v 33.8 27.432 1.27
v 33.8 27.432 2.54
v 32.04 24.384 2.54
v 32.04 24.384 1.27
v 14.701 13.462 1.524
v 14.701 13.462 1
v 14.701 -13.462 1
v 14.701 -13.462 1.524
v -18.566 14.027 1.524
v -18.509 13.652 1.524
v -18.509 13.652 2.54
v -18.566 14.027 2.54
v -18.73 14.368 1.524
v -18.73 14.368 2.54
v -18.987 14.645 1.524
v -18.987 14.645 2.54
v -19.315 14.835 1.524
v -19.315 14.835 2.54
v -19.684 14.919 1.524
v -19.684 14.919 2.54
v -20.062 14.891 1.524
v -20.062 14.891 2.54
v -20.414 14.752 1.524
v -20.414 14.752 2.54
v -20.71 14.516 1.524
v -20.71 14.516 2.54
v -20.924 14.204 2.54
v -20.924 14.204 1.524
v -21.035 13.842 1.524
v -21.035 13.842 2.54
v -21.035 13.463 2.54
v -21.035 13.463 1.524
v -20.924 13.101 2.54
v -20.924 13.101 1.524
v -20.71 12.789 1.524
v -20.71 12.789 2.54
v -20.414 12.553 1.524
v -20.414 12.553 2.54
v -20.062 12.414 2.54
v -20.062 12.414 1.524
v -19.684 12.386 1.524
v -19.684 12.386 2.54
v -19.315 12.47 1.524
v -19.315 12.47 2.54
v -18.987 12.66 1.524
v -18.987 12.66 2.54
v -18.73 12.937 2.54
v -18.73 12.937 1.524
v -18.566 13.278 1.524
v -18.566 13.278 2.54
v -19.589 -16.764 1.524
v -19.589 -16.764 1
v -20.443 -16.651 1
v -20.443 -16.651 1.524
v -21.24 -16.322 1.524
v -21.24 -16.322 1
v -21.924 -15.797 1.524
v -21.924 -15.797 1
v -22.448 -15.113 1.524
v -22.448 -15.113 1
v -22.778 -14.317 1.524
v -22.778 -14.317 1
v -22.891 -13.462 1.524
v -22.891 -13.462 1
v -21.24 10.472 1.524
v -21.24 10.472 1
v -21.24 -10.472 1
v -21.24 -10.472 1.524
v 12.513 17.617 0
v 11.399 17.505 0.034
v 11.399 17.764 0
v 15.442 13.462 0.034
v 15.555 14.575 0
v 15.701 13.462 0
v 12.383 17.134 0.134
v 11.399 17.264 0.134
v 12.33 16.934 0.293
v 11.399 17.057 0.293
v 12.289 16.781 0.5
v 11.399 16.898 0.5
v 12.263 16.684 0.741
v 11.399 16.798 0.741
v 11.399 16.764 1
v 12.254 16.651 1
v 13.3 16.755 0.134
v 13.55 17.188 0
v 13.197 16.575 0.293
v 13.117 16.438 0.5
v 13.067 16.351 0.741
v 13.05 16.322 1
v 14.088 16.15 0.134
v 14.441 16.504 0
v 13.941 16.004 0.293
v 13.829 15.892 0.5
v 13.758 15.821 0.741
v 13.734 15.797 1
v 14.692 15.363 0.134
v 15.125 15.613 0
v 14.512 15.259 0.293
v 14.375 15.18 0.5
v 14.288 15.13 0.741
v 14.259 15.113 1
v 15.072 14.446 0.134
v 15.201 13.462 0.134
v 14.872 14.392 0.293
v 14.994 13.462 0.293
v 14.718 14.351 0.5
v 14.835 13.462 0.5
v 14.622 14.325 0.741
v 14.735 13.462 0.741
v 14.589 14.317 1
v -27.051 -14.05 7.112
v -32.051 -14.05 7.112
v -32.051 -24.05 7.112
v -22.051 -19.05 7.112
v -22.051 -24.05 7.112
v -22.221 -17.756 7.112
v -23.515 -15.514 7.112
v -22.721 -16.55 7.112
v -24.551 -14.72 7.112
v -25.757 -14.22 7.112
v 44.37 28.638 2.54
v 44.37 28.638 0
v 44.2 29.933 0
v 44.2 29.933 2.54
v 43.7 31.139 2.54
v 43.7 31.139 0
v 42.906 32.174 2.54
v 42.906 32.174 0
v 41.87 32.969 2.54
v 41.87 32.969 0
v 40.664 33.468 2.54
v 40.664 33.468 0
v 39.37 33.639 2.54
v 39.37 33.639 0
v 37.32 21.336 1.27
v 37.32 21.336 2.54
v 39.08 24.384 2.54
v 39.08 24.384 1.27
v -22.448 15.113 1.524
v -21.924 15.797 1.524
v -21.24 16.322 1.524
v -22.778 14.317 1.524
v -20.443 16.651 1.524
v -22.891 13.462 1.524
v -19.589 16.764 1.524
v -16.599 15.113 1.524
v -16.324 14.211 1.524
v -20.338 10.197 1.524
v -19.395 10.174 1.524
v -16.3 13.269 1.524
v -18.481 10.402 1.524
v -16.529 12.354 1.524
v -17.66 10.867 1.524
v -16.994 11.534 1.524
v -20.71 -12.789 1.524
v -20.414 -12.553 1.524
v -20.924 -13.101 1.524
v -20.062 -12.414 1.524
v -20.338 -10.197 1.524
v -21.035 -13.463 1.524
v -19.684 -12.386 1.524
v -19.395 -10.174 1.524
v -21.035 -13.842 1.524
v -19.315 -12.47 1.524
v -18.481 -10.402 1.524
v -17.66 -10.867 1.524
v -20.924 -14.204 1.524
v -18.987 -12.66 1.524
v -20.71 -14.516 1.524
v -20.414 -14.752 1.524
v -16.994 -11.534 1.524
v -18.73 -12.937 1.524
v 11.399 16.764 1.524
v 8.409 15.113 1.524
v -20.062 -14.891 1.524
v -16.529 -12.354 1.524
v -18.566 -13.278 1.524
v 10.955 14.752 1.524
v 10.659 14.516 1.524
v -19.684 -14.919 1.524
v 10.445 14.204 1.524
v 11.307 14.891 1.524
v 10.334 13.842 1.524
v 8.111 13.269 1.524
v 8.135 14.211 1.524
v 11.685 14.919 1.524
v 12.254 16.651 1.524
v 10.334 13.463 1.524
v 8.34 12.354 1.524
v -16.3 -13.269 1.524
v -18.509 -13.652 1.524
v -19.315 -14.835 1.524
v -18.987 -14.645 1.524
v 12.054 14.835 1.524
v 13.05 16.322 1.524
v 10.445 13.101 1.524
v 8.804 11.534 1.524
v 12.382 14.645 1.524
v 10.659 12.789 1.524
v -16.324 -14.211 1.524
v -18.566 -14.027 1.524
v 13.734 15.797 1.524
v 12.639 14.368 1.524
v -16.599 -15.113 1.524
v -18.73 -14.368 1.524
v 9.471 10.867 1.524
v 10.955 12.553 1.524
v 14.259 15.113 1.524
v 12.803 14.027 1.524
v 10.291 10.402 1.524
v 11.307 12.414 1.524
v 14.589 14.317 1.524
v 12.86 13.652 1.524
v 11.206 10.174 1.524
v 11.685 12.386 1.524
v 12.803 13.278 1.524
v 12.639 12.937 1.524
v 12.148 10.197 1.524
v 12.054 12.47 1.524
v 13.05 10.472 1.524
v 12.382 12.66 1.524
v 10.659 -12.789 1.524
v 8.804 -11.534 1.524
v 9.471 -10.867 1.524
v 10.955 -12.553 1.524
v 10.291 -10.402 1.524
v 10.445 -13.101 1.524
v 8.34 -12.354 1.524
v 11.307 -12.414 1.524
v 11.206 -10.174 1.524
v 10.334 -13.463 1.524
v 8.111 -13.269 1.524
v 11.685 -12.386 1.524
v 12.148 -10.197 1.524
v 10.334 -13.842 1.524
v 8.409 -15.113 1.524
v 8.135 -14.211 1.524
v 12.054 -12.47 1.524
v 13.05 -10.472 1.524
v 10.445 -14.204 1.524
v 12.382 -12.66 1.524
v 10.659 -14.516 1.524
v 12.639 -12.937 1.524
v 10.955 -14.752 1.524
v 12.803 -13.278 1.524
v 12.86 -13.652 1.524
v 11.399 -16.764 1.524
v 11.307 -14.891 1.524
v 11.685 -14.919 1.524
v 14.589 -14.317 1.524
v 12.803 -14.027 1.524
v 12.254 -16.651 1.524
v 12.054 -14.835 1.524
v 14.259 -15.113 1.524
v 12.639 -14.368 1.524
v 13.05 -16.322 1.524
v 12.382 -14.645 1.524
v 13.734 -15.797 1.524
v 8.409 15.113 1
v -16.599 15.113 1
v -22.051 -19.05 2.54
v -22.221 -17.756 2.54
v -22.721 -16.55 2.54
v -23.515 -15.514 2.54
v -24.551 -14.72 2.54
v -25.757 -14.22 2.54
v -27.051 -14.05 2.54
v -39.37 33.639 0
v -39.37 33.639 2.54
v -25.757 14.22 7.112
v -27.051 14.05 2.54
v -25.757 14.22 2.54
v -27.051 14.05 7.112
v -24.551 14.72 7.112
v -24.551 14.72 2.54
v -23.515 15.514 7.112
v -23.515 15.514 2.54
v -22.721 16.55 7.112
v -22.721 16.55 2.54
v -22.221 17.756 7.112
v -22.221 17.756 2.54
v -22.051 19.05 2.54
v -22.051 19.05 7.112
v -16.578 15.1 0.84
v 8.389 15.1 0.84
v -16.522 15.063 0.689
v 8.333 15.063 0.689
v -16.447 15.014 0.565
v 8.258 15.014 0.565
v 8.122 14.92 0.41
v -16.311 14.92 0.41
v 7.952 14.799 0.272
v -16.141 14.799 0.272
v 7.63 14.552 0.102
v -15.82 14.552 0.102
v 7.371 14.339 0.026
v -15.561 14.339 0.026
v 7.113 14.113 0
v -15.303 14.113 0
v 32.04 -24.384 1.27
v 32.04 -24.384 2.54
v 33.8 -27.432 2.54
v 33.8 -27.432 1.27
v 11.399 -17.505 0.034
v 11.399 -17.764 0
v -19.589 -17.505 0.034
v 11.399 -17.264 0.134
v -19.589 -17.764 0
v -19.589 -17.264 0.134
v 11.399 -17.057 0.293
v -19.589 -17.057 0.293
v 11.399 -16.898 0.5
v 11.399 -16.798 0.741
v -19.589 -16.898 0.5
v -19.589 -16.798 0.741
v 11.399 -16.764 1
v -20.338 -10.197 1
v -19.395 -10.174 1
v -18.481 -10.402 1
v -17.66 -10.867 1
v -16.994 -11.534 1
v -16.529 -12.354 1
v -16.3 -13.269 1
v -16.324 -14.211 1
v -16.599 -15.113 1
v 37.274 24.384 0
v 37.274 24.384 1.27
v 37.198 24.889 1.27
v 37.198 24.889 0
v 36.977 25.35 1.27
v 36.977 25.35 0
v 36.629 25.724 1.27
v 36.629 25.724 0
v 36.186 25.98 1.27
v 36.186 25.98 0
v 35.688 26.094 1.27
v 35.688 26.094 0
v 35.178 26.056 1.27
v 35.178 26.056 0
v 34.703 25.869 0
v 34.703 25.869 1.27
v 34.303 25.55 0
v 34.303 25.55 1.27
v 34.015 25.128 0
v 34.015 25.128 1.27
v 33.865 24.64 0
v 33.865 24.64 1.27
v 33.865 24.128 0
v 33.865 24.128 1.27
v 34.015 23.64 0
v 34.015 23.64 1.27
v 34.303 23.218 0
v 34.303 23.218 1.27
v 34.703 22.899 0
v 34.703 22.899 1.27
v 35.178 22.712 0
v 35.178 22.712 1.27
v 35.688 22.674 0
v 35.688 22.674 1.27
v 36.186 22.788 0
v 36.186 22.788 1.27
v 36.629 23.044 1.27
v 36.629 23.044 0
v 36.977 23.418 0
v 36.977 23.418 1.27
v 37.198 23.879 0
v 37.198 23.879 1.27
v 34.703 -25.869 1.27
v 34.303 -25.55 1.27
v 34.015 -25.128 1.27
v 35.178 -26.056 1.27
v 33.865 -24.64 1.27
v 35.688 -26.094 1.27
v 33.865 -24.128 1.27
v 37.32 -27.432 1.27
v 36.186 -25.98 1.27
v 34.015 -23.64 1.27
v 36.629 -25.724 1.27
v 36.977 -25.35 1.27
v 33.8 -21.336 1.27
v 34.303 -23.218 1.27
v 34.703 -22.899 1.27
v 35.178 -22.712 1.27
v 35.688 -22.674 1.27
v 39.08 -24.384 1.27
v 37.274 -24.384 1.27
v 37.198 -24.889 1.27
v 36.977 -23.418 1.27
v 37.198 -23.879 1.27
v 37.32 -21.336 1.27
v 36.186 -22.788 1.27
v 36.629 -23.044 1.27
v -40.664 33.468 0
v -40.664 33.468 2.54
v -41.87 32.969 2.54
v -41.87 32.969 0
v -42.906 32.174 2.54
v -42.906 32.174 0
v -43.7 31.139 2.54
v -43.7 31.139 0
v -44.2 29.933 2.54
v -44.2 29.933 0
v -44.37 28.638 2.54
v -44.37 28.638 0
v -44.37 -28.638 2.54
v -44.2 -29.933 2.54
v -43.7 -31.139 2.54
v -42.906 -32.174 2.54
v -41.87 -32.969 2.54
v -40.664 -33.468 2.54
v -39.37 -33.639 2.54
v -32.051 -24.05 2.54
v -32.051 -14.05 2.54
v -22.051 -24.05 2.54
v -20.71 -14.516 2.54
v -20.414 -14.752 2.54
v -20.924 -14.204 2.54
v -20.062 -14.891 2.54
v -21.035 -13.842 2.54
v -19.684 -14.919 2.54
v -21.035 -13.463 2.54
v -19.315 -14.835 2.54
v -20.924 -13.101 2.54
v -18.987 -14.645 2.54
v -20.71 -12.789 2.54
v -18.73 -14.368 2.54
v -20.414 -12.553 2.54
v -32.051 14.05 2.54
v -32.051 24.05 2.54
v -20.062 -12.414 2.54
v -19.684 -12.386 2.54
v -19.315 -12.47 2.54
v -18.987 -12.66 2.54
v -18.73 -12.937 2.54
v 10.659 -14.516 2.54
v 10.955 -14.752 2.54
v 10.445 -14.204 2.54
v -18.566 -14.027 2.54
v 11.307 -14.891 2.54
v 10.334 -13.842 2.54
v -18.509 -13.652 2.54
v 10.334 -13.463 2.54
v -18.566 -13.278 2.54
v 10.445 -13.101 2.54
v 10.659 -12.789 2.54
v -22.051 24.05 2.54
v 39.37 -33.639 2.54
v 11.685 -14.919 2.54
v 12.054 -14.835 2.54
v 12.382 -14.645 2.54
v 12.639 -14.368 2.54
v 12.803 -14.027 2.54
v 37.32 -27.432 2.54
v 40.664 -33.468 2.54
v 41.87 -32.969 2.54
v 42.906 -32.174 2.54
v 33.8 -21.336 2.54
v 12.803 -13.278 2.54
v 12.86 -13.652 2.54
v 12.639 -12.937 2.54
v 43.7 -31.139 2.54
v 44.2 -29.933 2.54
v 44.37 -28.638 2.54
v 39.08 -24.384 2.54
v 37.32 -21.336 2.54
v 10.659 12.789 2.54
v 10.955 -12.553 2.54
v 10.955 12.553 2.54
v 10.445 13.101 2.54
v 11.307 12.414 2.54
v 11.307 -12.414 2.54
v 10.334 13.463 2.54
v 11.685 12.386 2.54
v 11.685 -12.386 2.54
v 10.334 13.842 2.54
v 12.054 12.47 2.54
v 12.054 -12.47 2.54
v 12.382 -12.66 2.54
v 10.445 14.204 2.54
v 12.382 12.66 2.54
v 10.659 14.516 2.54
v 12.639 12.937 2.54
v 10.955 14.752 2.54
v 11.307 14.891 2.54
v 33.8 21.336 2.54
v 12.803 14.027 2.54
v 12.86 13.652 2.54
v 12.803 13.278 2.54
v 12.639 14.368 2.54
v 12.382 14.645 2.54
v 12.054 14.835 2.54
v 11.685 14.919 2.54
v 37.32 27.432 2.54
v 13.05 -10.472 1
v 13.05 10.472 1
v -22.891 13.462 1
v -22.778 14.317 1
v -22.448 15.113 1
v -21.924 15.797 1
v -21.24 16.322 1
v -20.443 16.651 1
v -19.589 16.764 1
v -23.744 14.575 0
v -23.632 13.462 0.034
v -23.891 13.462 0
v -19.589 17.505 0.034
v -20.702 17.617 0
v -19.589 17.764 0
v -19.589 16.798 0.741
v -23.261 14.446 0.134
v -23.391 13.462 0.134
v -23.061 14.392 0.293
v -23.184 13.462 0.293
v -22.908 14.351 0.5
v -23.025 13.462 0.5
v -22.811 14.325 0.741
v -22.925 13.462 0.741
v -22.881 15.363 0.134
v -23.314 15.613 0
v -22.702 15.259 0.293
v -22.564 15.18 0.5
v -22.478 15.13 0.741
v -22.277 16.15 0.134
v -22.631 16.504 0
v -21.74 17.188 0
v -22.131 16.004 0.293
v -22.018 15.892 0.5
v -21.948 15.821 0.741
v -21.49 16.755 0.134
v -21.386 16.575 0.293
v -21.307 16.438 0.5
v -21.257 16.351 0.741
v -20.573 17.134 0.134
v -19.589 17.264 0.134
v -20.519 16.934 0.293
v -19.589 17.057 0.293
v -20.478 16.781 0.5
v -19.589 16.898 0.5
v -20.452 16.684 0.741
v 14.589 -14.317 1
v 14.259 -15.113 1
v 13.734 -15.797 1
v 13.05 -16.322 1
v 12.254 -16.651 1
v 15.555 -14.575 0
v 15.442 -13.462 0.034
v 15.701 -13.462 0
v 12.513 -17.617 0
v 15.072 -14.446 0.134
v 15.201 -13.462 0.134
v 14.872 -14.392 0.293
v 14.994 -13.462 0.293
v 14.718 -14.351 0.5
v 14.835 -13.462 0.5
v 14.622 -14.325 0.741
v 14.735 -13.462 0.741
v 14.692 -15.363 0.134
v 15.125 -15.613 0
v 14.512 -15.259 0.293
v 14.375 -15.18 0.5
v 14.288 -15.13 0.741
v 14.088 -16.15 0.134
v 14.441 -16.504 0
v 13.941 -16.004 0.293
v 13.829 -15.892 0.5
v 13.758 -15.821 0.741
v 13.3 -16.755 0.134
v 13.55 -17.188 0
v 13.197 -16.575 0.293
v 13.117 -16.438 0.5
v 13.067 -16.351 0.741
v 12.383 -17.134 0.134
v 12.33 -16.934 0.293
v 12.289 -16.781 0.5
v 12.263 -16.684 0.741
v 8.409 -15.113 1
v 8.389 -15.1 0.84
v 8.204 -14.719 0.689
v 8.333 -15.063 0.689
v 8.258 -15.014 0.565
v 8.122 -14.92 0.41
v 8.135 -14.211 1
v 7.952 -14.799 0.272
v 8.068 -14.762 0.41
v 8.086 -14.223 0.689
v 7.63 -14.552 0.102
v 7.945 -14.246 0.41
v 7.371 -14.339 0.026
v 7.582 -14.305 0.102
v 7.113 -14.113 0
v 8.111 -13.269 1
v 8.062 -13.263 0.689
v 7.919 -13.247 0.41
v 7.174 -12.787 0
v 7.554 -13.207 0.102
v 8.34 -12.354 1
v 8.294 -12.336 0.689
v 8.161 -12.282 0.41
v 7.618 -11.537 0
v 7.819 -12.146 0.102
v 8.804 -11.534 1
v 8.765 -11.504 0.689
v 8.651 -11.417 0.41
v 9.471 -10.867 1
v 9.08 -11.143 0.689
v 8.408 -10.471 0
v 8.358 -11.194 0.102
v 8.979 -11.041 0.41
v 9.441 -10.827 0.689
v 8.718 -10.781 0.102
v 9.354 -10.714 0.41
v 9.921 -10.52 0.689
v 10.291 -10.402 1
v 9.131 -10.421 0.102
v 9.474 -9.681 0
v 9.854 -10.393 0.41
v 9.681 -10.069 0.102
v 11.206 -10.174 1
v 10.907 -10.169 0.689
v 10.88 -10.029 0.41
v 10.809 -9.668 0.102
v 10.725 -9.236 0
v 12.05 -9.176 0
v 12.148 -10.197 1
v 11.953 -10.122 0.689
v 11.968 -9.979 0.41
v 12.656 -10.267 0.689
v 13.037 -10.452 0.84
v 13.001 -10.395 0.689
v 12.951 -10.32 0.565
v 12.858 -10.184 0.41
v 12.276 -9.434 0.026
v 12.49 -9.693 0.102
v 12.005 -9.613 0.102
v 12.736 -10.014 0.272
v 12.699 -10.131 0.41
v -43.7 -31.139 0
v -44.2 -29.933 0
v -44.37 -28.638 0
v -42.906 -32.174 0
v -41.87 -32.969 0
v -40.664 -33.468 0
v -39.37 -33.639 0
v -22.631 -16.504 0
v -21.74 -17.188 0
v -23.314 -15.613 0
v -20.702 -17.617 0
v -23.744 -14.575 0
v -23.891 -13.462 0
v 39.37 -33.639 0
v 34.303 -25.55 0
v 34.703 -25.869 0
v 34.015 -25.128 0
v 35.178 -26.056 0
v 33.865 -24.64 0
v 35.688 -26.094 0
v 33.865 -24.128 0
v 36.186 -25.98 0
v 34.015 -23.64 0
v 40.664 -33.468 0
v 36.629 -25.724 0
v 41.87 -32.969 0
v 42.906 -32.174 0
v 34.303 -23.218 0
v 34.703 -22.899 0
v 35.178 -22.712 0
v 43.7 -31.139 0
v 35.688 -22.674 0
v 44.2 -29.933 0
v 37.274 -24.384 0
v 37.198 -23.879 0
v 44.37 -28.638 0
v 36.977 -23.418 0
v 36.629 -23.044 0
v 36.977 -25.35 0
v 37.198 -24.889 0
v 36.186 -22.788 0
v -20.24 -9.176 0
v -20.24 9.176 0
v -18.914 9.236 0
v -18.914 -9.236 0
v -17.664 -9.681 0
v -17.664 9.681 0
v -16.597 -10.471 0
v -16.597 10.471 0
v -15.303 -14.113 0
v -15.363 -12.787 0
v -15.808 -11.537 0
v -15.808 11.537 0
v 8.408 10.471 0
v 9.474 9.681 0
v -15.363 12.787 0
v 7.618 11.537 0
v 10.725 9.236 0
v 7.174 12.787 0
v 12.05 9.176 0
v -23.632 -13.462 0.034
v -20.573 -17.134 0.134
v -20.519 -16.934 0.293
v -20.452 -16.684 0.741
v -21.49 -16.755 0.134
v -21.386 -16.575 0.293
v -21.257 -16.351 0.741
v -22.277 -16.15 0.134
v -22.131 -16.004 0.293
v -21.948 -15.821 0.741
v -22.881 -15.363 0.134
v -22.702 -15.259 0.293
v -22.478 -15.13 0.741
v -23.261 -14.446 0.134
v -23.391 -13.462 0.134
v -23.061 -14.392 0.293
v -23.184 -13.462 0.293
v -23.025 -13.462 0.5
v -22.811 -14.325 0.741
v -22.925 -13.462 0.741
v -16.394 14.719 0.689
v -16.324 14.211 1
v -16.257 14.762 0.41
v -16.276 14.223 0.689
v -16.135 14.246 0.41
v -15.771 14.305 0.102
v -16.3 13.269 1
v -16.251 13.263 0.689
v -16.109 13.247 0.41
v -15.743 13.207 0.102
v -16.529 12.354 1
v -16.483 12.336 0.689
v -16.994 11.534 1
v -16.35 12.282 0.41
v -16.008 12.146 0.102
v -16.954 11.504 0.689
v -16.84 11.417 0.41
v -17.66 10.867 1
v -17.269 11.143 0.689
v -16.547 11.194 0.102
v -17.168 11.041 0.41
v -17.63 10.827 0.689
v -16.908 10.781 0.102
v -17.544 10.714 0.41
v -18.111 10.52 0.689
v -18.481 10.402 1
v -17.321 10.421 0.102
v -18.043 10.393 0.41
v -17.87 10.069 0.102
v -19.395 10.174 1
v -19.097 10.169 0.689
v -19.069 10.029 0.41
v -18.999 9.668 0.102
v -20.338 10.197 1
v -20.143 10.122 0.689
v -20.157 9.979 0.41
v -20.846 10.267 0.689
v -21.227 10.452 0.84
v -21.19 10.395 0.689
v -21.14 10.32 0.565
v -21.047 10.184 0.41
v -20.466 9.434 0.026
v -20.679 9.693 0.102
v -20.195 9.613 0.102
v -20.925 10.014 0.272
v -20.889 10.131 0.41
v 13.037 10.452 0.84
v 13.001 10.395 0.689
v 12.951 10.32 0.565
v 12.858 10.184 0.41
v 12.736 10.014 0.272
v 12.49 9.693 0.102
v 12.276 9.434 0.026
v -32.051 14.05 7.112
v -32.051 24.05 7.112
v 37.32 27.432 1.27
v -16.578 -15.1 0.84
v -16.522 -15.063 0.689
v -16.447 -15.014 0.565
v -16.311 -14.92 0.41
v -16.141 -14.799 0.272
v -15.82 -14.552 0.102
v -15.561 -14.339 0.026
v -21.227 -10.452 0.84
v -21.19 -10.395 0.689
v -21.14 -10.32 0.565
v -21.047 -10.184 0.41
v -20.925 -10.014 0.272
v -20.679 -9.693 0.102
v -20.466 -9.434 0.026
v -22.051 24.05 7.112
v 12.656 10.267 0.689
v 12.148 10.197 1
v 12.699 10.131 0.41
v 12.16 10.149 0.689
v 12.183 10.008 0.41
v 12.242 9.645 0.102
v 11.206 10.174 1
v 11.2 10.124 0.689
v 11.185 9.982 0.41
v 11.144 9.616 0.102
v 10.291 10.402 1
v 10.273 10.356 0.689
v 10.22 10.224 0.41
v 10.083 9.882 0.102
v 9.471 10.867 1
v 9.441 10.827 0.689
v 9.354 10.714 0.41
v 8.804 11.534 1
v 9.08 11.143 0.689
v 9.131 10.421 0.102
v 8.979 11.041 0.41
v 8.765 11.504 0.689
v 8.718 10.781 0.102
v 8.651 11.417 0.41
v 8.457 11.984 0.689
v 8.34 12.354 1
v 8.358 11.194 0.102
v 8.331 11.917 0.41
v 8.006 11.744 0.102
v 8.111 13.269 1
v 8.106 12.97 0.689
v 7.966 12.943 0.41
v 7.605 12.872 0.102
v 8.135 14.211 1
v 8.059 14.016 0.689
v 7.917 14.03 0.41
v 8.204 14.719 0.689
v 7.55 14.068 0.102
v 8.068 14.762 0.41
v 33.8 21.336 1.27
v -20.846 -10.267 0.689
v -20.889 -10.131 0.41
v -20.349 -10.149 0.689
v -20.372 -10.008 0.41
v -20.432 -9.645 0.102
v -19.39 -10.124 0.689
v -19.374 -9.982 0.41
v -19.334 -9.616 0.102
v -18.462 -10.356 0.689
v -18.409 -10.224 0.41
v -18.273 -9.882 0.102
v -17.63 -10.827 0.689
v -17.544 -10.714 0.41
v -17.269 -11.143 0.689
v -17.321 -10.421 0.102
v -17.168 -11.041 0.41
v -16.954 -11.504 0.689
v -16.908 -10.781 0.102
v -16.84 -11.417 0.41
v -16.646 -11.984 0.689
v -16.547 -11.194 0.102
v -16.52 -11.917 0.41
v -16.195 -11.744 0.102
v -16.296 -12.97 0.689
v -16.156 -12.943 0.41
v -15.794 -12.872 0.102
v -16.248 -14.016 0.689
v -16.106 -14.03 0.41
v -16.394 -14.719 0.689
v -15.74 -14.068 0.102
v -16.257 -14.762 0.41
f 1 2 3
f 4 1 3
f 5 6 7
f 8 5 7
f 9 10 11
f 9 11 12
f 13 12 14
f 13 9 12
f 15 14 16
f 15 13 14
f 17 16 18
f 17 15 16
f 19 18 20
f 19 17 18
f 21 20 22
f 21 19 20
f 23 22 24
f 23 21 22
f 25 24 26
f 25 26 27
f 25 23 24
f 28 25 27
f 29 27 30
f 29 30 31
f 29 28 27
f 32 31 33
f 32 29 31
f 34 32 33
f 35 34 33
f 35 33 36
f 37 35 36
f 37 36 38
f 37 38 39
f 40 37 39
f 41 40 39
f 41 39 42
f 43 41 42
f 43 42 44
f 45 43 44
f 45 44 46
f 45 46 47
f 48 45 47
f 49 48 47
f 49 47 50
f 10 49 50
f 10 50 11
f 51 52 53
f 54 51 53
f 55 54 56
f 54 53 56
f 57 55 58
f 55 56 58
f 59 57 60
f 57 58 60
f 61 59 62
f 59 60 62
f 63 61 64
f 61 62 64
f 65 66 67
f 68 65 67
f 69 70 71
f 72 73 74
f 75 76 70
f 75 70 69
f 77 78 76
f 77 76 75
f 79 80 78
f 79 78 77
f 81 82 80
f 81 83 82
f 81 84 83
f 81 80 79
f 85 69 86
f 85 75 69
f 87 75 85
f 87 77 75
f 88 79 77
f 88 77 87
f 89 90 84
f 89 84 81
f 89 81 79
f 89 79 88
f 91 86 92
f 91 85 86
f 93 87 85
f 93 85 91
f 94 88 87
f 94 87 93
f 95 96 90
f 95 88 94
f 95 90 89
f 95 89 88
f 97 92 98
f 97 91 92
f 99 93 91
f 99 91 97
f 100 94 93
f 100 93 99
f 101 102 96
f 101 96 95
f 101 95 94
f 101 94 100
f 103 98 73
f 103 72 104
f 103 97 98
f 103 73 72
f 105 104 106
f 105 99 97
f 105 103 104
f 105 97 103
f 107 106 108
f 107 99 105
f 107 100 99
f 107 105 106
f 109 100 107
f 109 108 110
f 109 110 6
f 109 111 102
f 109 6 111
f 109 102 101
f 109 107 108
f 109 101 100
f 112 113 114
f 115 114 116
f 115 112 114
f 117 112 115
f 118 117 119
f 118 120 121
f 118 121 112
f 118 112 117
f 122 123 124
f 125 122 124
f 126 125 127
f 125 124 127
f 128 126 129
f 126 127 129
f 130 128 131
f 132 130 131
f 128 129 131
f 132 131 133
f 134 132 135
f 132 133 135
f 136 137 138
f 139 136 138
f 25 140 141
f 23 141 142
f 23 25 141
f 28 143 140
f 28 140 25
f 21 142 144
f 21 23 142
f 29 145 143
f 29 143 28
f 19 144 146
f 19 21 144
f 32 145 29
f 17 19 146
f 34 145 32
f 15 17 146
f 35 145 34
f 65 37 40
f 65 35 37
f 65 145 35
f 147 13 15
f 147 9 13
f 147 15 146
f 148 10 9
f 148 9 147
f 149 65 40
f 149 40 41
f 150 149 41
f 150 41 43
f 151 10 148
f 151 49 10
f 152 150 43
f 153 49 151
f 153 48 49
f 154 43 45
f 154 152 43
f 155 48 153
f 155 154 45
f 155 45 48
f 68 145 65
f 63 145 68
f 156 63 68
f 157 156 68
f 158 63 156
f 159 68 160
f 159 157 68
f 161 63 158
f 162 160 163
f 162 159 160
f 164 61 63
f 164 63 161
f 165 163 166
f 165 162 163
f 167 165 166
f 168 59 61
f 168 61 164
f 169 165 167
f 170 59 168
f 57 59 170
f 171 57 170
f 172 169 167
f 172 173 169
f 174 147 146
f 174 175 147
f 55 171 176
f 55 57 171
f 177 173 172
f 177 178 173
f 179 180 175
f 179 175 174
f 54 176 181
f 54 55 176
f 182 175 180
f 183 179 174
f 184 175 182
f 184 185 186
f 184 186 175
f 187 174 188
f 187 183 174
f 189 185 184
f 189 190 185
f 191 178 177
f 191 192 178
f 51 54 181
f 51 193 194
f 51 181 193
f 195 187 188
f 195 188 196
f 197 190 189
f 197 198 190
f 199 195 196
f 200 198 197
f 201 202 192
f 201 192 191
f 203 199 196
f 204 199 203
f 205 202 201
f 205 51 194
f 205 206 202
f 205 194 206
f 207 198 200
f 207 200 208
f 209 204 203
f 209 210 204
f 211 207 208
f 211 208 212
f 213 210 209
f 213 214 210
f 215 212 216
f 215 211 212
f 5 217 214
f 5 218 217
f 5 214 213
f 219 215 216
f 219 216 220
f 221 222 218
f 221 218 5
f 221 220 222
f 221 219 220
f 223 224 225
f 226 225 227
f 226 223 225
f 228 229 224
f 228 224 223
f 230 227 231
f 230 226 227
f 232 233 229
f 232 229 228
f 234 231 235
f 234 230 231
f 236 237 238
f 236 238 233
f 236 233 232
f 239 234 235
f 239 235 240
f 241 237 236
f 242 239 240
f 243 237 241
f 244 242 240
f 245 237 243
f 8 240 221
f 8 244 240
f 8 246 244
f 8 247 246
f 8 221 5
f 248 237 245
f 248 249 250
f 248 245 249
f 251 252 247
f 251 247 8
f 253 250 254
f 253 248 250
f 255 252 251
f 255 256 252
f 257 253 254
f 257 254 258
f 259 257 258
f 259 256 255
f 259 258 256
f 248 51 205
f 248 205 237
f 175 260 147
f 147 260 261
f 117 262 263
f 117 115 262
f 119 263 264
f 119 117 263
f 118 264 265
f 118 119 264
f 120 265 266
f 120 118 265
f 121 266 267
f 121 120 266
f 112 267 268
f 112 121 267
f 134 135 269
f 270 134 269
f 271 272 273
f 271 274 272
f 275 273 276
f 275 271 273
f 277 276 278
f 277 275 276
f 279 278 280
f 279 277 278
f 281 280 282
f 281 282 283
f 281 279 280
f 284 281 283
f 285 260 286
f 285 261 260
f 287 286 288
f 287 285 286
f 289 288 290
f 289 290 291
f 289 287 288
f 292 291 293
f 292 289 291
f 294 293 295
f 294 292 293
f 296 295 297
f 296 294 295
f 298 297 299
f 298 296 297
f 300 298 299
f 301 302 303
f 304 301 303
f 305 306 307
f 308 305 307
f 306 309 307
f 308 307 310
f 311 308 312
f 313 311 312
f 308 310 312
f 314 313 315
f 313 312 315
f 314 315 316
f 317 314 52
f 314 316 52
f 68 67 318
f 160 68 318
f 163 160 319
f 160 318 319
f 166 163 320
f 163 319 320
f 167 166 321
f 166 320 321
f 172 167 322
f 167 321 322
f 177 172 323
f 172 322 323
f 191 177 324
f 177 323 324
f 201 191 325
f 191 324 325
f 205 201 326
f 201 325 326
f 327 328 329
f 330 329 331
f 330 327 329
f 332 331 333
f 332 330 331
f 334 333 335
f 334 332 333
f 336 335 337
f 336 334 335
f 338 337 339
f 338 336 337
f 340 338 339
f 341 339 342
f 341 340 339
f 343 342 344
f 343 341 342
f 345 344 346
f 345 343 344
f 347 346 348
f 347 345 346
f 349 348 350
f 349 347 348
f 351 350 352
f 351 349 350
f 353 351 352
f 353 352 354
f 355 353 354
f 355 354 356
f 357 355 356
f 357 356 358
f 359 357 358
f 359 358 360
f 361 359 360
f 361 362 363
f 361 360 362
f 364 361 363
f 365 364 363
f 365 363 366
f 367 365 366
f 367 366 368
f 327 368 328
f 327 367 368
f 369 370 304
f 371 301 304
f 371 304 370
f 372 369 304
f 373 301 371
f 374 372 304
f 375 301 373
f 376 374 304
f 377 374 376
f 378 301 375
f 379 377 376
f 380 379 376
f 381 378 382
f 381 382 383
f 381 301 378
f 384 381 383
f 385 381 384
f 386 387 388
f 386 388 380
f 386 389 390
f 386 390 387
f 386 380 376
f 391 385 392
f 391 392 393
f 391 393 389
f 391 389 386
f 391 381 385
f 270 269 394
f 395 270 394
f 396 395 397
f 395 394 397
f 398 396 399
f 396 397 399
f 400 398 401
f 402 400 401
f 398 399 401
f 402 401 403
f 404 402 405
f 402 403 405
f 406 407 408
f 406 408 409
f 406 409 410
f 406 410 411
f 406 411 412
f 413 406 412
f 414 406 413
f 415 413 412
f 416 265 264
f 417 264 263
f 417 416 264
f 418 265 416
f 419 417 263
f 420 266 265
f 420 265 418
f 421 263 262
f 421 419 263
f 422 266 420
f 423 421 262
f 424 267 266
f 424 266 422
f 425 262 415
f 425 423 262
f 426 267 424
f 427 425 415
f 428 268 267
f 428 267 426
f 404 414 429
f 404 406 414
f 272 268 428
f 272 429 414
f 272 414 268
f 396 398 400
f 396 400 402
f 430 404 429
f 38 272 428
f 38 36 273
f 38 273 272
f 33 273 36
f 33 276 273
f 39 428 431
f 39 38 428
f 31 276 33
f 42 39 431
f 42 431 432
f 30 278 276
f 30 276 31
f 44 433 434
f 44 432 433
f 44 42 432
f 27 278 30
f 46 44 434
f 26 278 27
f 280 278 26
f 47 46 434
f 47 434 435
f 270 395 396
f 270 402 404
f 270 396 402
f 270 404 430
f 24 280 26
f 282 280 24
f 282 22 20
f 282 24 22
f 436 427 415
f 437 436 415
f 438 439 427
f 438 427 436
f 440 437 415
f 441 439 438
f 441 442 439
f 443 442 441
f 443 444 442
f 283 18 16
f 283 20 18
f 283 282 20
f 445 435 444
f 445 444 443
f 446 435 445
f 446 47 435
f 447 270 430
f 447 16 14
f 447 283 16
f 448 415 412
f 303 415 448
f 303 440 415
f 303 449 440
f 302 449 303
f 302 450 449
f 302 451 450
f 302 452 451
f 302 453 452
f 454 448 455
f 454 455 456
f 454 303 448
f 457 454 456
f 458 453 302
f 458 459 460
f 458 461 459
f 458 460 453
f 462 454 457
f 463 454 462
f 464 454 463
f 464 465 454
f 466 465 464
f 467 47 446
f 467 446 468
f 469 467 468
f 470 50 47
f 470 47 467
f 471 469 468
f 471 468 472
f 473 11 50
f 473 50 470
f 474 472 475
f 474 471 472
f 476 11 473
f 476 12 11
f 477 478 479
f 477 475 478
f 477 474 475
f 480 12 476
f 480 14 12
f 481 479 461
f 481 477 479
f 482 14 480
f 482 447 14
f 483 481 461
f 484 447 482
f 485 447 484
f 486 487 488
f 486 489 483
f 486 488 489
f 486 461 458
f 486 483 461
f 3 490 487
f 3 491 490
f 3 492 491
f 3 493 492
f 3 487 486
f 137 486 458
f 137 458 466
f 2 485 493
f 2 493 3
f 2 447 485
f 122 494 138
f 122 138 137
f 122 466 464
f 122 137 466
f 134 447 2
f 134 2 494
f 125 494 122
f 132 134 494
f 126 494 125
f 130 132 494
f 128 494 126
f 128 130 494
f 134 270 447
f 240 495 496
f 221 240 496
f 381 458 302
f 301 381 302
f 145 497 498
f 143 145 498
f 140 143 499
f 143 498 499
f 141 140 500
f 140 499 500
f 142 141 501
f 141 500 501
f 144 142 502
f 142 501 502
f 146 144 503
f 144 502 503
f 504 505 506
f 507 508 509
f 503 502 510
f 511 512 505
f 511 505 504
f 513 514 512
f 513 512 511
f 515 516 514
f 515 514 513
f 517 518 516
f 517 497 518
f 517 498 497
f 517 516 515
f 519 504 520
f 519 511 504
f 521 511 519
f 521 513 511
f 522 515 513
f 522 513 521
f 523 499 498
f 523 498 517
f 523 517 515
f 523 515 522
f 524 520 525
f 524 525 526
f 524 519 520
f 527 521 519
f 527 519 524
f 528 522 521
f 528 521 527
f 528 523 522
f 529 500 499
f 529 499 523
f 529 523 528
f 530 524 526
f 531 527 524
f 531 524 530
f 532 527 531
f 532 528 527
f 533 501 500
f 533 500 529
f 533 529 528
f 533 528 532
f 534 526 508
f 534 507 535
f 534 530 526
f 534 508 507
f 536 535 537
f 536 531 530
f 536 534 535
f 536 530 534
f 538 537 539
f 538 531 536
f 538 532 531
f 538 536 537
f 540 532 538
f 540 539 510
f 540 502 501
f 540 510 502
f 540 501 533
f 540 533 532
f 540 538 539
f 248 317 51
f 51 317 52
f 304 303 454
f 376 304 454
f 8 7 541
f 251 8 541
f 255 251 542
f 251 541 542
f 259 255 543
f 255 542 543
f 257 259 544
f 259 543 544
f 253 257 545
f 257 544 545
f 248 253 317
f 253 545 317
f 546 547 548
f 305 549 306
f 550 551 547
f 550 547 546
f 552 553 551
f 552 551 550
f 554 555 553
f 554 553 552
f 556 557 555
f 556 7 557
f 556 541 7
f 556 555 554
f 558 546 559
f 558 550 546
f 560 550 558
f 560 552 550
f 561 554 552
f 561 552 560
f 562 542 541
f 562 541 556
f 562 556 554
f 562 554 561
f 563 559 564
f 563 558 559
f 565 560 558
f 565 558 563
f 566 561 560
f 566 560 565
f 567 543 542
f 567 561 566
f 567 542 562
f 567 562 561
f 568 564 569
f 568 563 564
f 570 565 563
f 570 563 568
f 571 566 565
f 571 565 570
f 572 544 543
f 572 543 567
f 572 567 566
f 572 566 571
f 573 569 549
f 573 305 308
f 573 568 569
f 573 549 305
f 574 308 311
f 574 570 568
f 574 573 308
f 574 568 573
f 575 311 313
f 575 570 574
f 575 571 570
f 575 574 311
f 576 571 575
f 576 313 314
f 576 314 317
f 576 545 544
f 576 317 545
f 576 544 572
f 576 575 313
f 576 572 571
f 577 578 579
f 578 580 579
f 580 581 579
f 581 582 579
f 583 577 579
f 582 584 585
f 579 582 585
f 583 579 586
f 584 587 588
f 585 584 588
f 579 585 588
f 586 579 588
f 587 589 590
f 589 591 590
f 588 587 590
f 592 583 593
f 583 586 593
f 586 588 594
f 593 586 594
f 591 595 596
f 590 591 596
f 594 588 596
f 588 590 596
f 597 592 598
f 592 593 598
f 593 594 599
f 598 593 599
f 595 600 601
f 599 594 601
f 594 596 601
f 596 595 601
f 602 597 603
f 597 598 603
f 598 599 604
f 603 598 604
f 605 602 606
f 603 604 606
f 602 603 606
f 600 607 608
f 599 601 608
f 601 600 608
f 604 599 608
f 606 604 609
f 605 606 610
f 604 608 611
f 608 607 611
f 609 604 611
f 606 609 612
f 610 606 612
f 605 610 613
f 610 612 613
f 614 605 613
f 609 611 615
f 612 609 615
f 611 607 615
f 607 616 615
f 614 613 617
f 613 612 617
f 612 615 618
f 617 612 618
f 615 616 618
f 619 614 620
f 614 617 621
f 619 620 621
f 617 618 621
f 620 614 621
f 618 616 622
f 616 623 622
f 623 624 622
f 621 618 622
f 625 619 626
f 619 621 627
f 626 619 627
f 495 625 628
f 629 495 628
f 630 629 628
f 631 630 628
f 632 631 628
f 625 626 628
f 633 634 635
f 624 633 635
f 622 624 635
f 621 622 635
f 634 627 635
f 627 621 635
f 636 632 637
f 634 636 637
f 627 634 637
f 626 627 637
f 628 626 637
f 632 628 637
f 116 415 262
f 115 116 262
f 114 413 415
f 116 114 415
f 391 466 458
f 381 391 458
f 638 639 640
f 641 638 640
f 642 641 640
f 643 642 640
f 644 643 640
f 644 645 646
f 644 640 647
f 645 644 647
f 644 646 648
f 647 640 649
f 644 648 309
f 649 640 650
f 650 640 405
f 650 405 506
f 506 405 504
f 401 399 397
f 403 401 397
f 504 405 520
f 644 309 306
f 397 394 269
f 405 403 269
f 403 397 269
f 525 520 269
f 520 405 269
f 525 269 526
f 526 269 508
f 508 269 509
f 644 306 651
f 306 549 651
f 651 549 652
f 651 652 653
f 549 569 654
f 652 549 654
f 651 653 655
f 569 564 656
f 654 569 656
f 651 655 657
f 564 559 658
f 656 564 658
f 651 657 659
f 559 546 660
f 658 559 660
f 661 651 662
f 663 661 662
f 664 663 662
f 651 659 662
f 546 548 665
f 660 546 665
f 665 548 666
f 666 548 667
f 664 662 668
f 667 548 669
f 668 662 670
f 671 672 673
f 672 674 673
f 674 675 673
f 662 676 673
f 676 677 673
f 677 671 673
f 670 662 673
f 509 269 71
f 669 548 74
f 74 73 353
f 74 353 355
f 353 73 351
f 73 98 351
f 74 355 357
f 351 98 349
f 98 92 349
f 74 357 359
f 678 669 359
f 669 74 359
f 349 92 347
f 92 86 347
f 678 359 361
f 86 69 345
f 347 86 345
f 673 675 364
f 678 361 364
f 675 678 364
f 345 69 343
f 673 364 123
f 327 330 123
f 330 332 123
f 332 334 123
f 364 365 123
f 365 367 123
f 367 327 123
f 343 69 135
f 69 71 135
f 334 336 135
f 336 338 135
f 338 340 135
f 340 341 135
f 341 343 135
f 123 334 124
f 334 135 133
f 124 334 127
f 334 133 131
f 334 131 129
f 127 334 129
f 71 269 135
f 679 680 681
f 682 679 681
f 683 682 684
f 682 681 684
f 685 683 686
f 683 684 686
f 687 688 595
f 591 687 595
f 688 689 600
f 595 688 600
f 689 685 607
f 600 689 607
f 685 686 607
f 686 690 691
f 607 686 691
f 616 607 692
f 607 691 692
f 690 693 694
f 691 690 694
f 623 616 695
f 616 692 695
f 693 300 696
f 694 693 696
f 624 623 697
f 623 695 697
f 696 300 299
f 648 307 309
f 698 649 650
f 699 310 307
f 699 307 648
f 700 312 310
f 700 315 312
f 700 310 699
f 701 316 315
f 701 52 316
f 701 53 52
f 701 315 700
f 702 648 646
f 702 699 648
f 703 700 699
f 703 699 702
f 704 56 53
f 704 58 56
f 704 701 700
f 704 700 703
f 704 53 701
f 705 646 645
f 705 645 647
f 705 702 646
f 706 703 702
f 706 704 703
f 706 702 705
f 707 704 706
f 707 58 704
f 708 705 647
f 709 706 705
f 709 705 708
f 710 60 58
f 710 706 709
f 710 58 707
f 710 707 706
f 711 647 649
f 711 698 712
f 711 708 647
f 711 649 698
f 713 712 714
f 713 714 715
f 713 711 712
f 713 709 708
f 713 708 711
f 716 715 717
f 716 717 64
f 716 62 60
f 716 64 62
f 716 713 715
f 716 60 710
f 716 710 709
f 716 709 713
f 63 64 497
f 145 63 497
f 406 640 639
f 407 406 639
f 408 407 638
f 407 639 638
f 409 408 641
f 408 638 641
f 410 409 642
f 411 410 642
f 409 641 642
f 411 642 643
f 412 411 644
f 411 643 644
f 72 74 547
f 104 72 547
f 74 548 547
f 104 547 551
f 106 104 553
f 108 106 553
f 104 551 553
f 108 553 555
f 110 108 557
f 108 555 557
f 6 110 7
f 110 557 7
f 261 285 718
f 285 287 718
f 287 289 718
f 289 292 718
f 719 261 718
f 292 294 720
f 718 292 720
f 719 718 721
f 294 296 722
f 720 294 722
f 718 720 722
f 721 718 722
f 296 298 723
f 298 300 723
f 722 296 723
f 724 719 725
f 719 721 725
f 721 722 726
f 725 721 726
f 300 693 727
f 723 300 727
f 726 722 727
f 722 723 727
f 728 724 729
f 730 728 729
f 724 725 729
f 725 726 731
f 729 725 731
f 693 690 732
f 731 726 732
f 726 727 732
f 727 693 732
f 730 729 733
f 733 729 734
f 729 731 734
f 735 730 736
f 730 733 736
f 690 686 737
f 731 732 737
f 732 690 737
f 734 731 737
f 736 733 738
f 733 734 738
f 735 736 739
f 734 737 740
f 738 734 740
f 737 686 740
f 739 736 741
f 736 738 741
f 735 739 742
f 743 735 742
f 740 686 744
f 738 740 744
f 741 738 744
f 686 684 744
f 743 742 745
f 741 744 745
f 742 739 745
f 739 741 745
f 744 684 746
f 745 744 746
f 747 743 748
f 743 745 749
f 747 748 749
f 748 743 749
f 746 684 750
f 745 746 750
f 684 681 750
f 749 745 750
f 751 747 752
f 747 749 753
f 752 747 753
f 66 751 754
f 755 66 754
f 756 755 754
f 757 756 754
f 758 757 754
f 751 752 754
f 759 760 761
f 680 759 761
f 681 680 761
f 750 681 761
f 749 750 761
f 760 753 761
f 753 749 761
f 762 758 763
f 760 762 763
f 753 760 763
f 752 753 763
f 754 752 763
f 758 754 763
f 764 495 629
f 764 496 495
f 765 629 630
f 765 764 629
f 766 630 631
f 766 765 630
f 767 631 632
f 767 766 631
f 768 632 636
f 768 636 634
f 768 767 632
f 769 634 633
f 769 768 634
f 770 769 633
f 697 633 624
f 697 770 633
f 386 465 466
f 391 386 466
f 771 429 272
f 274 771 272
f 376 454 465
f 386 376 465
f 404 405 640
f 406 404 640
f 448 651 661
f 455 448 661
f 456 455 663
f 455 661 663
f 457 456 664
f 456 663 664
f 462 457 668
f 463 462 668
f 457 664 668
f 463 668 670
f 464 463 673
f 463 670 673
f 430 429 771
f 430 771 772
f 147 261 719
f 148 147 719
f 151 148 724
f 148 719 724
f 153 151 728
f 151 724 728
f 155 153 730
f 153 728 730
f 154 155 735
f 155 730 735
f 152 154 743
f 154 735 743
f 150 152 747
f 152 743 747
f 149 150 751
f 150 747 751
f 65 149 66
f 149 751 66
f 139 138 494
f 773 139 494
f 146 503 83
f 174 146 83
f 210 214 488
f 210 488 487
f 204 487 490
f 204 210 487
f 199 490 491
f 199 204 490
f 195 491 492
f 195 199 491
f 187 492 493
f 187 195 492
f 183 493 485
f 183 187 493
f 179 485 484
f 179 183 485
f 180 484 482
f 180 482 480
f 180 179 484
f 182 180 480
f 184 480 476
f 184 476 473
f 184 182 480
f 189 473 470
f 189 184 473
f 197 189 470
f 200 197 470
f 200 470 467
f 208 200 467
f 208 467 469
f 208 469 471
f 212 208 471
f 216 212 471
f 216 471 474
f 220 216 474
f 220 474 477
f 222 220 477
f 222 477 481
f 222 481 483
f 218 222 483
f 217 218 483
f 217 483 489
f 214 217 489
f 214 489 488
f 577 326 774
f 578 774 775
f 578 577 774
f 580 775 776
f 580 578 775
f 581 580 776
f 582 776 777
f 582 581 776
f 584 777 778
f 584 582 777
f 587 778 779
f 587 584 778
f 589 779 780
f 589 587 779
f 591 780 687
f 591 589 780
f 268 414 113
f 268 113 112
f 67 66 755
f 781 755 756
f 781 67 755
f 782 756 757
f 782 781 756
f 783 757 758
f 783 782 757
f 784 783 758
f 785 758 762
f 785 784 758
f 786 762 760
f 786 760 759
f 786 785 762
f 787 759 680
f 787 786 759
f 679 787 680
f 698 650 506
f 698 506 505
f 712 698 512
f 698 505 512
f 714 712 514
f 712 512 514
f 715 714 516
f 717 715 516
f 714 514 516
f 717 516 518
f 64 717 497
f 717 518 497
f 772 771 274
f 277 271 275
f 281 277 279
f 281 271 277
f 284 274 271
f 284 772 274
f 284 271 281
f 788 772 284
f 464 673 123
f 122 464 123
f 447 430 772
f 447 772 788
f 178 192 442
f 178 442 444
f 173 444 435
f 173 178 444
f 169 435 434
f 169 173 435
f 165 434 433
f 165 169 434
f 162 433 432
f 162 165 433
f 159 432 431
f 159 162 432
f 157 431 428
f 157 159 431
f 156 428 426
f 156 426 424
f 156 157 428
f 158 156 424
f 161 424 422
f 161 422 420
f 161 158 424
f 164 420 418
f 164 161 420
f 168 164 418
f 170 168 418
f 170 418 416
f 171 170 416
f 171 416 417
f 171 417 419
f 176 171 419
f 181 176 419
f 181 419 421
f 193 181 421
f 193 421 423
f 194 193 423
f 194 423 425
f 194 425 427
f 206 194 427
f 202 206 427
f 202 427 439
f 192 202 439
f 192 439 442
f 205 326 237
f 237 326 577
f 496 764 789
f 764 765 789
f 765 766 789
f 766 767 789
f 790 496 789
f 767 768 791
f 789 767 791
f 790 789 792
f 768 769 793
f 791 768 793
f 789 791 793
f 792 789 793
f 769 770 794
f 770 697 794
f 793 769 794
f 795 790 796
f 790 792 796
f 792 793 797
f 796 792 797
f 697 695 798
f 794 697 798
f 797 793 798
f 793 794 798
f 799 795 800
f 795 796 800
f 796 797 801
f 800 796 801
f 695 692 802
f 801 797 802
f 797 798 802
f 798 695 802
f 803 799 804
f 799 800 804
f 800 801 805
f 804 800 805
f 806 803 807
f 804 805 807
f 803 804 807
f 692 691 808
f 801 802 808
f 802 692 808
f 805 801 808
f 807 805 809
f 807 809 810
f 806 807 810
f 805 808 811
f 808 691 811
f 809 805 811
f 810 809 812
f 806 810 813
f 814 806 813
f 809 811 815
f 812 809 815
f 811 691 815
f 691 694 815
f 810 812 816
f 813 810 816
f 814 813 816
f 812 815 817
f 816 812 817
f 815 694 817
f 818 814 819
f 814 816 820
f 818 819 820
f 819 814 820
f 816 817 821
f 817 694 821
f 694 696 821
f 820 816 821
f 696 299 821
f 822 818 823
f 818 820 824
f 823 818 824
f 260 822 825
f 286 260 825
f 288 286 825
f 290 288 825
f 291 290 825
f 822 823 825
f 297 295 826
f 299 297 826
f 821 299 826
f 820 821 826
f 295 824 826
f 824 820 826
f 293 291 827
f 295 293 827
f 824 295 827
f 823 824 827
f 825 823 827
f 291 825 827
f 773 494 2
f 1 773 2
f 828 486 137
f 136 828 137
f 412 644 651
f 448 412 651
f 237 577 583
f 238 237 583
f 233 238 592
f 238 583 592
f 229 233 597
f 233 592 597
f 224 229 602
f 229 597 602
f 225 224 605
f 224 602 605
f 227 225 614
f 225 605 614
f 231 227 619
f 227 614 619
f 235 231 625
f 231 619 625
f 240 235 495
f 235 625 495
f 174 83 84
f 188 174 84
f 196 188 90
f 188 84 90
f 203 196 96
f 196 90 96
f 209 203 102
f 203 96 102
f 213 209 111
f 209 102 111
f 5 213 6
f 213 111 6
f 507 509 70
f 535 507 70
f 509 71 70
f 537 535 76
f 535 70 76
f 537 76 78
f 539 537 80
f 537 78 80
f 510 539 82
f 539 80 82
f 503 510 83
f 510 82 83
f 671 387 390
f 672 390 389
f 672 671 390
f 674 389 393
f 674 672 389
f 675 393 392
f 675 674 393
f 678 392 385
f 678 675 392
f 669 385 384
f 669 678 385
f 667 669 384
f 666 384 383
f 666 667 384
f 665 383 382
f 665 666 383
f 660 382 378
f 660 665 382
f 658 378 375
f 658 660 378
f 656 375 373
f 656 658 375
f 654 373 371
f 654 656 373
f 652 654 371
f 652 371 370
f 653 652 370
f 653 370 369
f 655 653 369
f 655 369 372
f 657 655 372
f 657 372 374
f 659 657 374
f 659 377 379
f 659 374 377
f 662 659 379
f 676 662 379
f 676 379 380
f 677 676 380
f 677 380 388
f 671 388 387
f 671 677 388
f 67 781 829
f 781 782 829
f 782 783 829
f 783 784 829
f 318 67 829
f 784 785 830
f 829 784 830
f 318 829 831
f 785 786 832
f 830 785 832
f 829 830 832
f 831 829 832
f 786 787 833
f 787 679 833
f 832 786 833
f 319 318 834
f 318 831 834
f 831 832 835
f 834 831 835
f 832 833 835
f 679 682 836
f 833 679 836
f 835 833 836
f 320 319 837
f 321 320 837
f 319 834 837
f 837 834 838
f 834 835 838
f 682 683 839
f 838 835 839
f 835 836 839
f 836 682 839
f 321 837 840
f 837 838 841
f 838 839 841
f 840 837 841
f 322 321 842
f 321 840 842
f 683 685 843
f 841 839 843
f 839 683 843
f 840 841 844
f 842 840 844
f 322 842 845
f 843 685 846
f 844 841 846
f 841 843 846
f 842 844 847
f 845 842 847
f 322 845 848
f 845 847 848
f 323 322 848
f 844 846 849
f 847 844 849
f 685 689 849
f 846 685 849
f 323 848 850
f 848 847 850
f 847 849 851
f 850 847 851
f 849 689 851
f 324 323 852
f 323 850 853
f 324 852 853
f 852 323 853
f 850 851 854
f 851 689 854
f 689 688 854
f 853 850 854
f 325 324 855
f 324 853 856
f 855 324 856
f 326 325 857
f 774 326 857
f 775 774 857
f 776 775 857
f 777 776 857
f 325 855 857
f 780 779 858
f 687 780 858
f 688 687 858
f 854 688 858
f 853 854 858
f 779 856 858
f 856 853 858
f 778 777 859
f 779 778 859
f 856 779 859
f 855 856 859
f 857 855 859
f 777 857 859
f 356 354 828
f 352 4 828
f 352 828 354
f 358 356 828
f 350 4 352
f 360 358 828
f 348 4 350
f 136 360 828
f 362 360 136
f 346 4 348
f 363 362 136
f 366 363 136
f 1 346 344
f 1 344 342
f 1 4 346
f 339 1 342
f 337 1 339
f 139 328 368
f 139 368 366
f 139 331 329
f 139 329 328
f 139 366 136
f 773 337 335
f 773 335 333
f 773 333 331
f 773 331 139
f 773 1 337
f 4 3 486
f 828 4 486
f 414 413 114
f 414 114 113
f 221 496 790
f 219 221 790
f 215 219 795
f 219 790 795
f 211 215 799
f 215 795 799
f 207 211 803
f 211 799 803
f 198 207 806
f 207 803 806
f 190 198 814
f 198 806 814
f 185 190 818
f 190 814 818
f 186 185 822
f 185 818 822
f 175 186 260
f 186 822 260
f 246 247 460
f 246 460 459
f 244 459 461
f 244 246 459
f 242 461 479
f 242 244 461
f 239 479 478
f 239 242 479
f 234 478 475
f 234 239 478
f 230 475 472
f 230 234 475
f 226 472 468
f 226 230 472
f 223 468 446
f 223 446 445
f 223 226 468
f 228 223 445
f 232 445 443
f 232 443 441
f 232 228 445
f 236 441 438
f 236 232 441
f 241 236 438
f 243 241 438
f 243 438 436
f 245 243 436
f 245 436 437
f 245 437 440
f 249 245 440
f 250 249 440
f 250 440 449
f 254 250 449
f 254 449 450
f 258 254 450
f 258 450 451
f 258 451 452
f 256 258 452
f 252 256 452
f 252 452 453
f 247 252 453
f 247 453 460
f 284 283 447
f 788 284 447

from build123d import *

# Parameters (mm, degrees)
F0_R     = 1.27
F0_R_2   = 1.7145
F1_DEPTH = 2.54
F3_DEPTH = 1.524
F4_R     = 1
F6_DEPTH = 1.27
F7_W     = 10
F7_H     = 10
F8_DEPTH = 4.572
F9_R     = 5


with BuildPart() as f1:
    # F0 (on Top) → F1 (new body)
    with BuildSketch(Plane.XY):
        with BuildLine():
            Line((39.37, 33.6385), (-39.37, 33.6385))
            ThreePointArc((-39.37, 33.6385), (-42.905534, 32.174034), (-44.37, 28.6385))
            Line((-44.37, 28.6385), (-44.37, -28.6385))
            ThreePointArc((-44.37, -28.6385), (-42.905534, -32.174034), (-39.37, -33.6385))
            Line((-39.37, -33.6385), (39.37, -33.6385))
            ThreePointArc((39.37, -33.6385), (42.905534, -32.174034), (44.37, -28.6385))
            Line((44.37, -28.6385), (44.37, 28.6385))
            ThreePointArc((44.37, 28.6385), (42.905534, 32.174034), (39.37, 33.6385))
        make_face()
        with Locations((-19.779271, -13.6525)):
            Circle(F0_R, mode=Mode.SUBTRACT)
        Polygon((39.079527, -24.384), (37.319764, -27.432), (33.800236, -27.432), (32.040473, -24.384), (33.800236, -21.336), (37.319764, -21.336), align=None, mode=Mode.SUBTRACT)
        with Locations((11.589729, -13.6525)):
            Circle(F0_R, mode=Mode.SUBTRACT)
        with Locations((-19.779271, 13.6525)):
            Circle(F0_R, mode=Mode.SUBTRACT)
        with Locations((11.589729, 13.6525)):
            Circle(F0_R, mode=Mode.SUBTRACT)
        Polygon((39.079527, 24.384), (37.319764, 21.336), (33.800236, 21.336), (32.040473, 24.384), (33.800236, 27.432), (37.319764, 27.432), align=None, mode=Mode.SUBTRACT)
        Polygon((33.800236, 21.336), (37.319764, 21.336), (39.079527, 24.384), (37.319764, 27.432), (33.800236, 27.432), (32.040473, 24.384), align=None)
        with Locations((35.56, 24.384)):
            Circle(F0_R_2, mode=Mode.SUBTRACT)
        Polygon((33.800236, -27.432), (37.319764, -27.432), (39.079527, -24.384), (37.319764, -21.336), (33.800236, -21.336), (32.040473, -24.384), align=None)
        with Locations((35.56, -24.384)):
            Circle(F0_R_2, mode=Mode.SUBTRACT)
    extrude(amount=F1_DEPTH)

    # F2 (on face) → F3 (cut)
    with BuildSketch(Plane(origin=(0, 0, 0), x_dir=(1, 0, 0), z_dir=(0, 0, -1))):
        with BuildLine():
            Line((11.399229, 16.764), (-19.588771, 16.764))
            ThreePointArc((-19.588771, 16.764), (-21.923637, 15.796867), (-22.890771, 13.462))
            Line((-22.890771, 13.462), (-22.890771, -13.462))
            ThreePointArc((-22.890771, -13.462), (-21.923637, -15.796867), (-19.588771, -16.764))
            Line((-19.588771, -16.764), (11.399229, -16.764))
            ThreePointArc((11.399229, -16.764), (13.734096, -15.796867), (14.701229, -13.462))
            Line((14.701229, -13.462), (14.701229, 13.462))
            ThreePointArc((14.701229, 13.462), (13.734096, 15.796867), (11.399229, 16.764))
        make_face()
        with BuildLine():
            Line((-21.239771, -10.471786), (-21.239771, 10.471786))
            ThreePointArc((-21.239771, 10.471786), (-17.304397, 11.177626), (-16.598557, 15.113))
            Line((-16.598557, 15.113), (8.409016, 15.113))
            ThreePointArc((8.409016, 15.113), (9.114856, 11.177626), (13.050229, 10.471786))
            Line((13.050229, 10.471786), (13.050229, -10.471786))
            ThreePointArc((13.050229, -10.471786), (9.114856, -11.177626), (8.409016, -15.113))
            Line((8.409016, -15.113), (-16.598557, -15.113))
            ThreePointArc((-16.598557, -15.113), (-17.304397, -11.177626), (-21.239771, -10.471786))
        make_face(mode=Mode.SUBTRACT)
    extrude(amount=-F3_DEPTH, mode=Mode.SUBTRACT)

    # F4
    f4_edges = [f1.edges().sort_by_distance(p)[0] for p in [
        (-17.304397, 11.177626, 0),
        (-4.094771, 15.113, 0),
        (9.114856, 11.177626, 0),
        (13.050229, 0, 0),
        (9.114856, -11.177626, 0),
        (-4.094771, -15.113, 0),
        (-17.304397, -11.177626, 0),
        (-21.239771, 0, 0),
        (-22.890771, 0, 0),
        (-21.923637, -15.796867, 0),
    ]]
    fillet(f4_edges, radius=F4_R)

    # F5 (on face) → F6 (cut)
    with BuildSketch(Plane.XY.offset(2.54)):
        Polygon((33.800236, 27.432), (32.040473, 24.384), (33.800236, 21.336), (37.319764, 21.336), (39.079527, 24.384), (37.319764, 27.432), align=None)
        Polygon((33.800236, -21.336), (32.040473, -24.384), (33.800236, -27.432), (37.319764, -27.432), (39.079527, -24.384), (37.319764, -21.336), align=None)
    extrude(amount=-F6_DEPTH, mode=Mode.SUBTRACT)

    # F7 (on face) → F8 (join)
    with BuildSketch(Plane.XY.offset(2.54)):
        with Locations((-27.051, 19.05)):
            Rectangle(F7_W, F7_H)
        with Locations((-27.051, -19.05)):
            Rectangle(F7_W, F7_H)
    extrude(amount=F8_DEPTH)

    # F9
    f9_edges = [f1.edges().sort_by_distance(p)[0] for p in [
        (-22.051, -14.05, 4.826),
        (-22.051, 14.05, 4.826),
    ]]
    fillet(f9_edges, radius=F9_R)


solid = f1.part
